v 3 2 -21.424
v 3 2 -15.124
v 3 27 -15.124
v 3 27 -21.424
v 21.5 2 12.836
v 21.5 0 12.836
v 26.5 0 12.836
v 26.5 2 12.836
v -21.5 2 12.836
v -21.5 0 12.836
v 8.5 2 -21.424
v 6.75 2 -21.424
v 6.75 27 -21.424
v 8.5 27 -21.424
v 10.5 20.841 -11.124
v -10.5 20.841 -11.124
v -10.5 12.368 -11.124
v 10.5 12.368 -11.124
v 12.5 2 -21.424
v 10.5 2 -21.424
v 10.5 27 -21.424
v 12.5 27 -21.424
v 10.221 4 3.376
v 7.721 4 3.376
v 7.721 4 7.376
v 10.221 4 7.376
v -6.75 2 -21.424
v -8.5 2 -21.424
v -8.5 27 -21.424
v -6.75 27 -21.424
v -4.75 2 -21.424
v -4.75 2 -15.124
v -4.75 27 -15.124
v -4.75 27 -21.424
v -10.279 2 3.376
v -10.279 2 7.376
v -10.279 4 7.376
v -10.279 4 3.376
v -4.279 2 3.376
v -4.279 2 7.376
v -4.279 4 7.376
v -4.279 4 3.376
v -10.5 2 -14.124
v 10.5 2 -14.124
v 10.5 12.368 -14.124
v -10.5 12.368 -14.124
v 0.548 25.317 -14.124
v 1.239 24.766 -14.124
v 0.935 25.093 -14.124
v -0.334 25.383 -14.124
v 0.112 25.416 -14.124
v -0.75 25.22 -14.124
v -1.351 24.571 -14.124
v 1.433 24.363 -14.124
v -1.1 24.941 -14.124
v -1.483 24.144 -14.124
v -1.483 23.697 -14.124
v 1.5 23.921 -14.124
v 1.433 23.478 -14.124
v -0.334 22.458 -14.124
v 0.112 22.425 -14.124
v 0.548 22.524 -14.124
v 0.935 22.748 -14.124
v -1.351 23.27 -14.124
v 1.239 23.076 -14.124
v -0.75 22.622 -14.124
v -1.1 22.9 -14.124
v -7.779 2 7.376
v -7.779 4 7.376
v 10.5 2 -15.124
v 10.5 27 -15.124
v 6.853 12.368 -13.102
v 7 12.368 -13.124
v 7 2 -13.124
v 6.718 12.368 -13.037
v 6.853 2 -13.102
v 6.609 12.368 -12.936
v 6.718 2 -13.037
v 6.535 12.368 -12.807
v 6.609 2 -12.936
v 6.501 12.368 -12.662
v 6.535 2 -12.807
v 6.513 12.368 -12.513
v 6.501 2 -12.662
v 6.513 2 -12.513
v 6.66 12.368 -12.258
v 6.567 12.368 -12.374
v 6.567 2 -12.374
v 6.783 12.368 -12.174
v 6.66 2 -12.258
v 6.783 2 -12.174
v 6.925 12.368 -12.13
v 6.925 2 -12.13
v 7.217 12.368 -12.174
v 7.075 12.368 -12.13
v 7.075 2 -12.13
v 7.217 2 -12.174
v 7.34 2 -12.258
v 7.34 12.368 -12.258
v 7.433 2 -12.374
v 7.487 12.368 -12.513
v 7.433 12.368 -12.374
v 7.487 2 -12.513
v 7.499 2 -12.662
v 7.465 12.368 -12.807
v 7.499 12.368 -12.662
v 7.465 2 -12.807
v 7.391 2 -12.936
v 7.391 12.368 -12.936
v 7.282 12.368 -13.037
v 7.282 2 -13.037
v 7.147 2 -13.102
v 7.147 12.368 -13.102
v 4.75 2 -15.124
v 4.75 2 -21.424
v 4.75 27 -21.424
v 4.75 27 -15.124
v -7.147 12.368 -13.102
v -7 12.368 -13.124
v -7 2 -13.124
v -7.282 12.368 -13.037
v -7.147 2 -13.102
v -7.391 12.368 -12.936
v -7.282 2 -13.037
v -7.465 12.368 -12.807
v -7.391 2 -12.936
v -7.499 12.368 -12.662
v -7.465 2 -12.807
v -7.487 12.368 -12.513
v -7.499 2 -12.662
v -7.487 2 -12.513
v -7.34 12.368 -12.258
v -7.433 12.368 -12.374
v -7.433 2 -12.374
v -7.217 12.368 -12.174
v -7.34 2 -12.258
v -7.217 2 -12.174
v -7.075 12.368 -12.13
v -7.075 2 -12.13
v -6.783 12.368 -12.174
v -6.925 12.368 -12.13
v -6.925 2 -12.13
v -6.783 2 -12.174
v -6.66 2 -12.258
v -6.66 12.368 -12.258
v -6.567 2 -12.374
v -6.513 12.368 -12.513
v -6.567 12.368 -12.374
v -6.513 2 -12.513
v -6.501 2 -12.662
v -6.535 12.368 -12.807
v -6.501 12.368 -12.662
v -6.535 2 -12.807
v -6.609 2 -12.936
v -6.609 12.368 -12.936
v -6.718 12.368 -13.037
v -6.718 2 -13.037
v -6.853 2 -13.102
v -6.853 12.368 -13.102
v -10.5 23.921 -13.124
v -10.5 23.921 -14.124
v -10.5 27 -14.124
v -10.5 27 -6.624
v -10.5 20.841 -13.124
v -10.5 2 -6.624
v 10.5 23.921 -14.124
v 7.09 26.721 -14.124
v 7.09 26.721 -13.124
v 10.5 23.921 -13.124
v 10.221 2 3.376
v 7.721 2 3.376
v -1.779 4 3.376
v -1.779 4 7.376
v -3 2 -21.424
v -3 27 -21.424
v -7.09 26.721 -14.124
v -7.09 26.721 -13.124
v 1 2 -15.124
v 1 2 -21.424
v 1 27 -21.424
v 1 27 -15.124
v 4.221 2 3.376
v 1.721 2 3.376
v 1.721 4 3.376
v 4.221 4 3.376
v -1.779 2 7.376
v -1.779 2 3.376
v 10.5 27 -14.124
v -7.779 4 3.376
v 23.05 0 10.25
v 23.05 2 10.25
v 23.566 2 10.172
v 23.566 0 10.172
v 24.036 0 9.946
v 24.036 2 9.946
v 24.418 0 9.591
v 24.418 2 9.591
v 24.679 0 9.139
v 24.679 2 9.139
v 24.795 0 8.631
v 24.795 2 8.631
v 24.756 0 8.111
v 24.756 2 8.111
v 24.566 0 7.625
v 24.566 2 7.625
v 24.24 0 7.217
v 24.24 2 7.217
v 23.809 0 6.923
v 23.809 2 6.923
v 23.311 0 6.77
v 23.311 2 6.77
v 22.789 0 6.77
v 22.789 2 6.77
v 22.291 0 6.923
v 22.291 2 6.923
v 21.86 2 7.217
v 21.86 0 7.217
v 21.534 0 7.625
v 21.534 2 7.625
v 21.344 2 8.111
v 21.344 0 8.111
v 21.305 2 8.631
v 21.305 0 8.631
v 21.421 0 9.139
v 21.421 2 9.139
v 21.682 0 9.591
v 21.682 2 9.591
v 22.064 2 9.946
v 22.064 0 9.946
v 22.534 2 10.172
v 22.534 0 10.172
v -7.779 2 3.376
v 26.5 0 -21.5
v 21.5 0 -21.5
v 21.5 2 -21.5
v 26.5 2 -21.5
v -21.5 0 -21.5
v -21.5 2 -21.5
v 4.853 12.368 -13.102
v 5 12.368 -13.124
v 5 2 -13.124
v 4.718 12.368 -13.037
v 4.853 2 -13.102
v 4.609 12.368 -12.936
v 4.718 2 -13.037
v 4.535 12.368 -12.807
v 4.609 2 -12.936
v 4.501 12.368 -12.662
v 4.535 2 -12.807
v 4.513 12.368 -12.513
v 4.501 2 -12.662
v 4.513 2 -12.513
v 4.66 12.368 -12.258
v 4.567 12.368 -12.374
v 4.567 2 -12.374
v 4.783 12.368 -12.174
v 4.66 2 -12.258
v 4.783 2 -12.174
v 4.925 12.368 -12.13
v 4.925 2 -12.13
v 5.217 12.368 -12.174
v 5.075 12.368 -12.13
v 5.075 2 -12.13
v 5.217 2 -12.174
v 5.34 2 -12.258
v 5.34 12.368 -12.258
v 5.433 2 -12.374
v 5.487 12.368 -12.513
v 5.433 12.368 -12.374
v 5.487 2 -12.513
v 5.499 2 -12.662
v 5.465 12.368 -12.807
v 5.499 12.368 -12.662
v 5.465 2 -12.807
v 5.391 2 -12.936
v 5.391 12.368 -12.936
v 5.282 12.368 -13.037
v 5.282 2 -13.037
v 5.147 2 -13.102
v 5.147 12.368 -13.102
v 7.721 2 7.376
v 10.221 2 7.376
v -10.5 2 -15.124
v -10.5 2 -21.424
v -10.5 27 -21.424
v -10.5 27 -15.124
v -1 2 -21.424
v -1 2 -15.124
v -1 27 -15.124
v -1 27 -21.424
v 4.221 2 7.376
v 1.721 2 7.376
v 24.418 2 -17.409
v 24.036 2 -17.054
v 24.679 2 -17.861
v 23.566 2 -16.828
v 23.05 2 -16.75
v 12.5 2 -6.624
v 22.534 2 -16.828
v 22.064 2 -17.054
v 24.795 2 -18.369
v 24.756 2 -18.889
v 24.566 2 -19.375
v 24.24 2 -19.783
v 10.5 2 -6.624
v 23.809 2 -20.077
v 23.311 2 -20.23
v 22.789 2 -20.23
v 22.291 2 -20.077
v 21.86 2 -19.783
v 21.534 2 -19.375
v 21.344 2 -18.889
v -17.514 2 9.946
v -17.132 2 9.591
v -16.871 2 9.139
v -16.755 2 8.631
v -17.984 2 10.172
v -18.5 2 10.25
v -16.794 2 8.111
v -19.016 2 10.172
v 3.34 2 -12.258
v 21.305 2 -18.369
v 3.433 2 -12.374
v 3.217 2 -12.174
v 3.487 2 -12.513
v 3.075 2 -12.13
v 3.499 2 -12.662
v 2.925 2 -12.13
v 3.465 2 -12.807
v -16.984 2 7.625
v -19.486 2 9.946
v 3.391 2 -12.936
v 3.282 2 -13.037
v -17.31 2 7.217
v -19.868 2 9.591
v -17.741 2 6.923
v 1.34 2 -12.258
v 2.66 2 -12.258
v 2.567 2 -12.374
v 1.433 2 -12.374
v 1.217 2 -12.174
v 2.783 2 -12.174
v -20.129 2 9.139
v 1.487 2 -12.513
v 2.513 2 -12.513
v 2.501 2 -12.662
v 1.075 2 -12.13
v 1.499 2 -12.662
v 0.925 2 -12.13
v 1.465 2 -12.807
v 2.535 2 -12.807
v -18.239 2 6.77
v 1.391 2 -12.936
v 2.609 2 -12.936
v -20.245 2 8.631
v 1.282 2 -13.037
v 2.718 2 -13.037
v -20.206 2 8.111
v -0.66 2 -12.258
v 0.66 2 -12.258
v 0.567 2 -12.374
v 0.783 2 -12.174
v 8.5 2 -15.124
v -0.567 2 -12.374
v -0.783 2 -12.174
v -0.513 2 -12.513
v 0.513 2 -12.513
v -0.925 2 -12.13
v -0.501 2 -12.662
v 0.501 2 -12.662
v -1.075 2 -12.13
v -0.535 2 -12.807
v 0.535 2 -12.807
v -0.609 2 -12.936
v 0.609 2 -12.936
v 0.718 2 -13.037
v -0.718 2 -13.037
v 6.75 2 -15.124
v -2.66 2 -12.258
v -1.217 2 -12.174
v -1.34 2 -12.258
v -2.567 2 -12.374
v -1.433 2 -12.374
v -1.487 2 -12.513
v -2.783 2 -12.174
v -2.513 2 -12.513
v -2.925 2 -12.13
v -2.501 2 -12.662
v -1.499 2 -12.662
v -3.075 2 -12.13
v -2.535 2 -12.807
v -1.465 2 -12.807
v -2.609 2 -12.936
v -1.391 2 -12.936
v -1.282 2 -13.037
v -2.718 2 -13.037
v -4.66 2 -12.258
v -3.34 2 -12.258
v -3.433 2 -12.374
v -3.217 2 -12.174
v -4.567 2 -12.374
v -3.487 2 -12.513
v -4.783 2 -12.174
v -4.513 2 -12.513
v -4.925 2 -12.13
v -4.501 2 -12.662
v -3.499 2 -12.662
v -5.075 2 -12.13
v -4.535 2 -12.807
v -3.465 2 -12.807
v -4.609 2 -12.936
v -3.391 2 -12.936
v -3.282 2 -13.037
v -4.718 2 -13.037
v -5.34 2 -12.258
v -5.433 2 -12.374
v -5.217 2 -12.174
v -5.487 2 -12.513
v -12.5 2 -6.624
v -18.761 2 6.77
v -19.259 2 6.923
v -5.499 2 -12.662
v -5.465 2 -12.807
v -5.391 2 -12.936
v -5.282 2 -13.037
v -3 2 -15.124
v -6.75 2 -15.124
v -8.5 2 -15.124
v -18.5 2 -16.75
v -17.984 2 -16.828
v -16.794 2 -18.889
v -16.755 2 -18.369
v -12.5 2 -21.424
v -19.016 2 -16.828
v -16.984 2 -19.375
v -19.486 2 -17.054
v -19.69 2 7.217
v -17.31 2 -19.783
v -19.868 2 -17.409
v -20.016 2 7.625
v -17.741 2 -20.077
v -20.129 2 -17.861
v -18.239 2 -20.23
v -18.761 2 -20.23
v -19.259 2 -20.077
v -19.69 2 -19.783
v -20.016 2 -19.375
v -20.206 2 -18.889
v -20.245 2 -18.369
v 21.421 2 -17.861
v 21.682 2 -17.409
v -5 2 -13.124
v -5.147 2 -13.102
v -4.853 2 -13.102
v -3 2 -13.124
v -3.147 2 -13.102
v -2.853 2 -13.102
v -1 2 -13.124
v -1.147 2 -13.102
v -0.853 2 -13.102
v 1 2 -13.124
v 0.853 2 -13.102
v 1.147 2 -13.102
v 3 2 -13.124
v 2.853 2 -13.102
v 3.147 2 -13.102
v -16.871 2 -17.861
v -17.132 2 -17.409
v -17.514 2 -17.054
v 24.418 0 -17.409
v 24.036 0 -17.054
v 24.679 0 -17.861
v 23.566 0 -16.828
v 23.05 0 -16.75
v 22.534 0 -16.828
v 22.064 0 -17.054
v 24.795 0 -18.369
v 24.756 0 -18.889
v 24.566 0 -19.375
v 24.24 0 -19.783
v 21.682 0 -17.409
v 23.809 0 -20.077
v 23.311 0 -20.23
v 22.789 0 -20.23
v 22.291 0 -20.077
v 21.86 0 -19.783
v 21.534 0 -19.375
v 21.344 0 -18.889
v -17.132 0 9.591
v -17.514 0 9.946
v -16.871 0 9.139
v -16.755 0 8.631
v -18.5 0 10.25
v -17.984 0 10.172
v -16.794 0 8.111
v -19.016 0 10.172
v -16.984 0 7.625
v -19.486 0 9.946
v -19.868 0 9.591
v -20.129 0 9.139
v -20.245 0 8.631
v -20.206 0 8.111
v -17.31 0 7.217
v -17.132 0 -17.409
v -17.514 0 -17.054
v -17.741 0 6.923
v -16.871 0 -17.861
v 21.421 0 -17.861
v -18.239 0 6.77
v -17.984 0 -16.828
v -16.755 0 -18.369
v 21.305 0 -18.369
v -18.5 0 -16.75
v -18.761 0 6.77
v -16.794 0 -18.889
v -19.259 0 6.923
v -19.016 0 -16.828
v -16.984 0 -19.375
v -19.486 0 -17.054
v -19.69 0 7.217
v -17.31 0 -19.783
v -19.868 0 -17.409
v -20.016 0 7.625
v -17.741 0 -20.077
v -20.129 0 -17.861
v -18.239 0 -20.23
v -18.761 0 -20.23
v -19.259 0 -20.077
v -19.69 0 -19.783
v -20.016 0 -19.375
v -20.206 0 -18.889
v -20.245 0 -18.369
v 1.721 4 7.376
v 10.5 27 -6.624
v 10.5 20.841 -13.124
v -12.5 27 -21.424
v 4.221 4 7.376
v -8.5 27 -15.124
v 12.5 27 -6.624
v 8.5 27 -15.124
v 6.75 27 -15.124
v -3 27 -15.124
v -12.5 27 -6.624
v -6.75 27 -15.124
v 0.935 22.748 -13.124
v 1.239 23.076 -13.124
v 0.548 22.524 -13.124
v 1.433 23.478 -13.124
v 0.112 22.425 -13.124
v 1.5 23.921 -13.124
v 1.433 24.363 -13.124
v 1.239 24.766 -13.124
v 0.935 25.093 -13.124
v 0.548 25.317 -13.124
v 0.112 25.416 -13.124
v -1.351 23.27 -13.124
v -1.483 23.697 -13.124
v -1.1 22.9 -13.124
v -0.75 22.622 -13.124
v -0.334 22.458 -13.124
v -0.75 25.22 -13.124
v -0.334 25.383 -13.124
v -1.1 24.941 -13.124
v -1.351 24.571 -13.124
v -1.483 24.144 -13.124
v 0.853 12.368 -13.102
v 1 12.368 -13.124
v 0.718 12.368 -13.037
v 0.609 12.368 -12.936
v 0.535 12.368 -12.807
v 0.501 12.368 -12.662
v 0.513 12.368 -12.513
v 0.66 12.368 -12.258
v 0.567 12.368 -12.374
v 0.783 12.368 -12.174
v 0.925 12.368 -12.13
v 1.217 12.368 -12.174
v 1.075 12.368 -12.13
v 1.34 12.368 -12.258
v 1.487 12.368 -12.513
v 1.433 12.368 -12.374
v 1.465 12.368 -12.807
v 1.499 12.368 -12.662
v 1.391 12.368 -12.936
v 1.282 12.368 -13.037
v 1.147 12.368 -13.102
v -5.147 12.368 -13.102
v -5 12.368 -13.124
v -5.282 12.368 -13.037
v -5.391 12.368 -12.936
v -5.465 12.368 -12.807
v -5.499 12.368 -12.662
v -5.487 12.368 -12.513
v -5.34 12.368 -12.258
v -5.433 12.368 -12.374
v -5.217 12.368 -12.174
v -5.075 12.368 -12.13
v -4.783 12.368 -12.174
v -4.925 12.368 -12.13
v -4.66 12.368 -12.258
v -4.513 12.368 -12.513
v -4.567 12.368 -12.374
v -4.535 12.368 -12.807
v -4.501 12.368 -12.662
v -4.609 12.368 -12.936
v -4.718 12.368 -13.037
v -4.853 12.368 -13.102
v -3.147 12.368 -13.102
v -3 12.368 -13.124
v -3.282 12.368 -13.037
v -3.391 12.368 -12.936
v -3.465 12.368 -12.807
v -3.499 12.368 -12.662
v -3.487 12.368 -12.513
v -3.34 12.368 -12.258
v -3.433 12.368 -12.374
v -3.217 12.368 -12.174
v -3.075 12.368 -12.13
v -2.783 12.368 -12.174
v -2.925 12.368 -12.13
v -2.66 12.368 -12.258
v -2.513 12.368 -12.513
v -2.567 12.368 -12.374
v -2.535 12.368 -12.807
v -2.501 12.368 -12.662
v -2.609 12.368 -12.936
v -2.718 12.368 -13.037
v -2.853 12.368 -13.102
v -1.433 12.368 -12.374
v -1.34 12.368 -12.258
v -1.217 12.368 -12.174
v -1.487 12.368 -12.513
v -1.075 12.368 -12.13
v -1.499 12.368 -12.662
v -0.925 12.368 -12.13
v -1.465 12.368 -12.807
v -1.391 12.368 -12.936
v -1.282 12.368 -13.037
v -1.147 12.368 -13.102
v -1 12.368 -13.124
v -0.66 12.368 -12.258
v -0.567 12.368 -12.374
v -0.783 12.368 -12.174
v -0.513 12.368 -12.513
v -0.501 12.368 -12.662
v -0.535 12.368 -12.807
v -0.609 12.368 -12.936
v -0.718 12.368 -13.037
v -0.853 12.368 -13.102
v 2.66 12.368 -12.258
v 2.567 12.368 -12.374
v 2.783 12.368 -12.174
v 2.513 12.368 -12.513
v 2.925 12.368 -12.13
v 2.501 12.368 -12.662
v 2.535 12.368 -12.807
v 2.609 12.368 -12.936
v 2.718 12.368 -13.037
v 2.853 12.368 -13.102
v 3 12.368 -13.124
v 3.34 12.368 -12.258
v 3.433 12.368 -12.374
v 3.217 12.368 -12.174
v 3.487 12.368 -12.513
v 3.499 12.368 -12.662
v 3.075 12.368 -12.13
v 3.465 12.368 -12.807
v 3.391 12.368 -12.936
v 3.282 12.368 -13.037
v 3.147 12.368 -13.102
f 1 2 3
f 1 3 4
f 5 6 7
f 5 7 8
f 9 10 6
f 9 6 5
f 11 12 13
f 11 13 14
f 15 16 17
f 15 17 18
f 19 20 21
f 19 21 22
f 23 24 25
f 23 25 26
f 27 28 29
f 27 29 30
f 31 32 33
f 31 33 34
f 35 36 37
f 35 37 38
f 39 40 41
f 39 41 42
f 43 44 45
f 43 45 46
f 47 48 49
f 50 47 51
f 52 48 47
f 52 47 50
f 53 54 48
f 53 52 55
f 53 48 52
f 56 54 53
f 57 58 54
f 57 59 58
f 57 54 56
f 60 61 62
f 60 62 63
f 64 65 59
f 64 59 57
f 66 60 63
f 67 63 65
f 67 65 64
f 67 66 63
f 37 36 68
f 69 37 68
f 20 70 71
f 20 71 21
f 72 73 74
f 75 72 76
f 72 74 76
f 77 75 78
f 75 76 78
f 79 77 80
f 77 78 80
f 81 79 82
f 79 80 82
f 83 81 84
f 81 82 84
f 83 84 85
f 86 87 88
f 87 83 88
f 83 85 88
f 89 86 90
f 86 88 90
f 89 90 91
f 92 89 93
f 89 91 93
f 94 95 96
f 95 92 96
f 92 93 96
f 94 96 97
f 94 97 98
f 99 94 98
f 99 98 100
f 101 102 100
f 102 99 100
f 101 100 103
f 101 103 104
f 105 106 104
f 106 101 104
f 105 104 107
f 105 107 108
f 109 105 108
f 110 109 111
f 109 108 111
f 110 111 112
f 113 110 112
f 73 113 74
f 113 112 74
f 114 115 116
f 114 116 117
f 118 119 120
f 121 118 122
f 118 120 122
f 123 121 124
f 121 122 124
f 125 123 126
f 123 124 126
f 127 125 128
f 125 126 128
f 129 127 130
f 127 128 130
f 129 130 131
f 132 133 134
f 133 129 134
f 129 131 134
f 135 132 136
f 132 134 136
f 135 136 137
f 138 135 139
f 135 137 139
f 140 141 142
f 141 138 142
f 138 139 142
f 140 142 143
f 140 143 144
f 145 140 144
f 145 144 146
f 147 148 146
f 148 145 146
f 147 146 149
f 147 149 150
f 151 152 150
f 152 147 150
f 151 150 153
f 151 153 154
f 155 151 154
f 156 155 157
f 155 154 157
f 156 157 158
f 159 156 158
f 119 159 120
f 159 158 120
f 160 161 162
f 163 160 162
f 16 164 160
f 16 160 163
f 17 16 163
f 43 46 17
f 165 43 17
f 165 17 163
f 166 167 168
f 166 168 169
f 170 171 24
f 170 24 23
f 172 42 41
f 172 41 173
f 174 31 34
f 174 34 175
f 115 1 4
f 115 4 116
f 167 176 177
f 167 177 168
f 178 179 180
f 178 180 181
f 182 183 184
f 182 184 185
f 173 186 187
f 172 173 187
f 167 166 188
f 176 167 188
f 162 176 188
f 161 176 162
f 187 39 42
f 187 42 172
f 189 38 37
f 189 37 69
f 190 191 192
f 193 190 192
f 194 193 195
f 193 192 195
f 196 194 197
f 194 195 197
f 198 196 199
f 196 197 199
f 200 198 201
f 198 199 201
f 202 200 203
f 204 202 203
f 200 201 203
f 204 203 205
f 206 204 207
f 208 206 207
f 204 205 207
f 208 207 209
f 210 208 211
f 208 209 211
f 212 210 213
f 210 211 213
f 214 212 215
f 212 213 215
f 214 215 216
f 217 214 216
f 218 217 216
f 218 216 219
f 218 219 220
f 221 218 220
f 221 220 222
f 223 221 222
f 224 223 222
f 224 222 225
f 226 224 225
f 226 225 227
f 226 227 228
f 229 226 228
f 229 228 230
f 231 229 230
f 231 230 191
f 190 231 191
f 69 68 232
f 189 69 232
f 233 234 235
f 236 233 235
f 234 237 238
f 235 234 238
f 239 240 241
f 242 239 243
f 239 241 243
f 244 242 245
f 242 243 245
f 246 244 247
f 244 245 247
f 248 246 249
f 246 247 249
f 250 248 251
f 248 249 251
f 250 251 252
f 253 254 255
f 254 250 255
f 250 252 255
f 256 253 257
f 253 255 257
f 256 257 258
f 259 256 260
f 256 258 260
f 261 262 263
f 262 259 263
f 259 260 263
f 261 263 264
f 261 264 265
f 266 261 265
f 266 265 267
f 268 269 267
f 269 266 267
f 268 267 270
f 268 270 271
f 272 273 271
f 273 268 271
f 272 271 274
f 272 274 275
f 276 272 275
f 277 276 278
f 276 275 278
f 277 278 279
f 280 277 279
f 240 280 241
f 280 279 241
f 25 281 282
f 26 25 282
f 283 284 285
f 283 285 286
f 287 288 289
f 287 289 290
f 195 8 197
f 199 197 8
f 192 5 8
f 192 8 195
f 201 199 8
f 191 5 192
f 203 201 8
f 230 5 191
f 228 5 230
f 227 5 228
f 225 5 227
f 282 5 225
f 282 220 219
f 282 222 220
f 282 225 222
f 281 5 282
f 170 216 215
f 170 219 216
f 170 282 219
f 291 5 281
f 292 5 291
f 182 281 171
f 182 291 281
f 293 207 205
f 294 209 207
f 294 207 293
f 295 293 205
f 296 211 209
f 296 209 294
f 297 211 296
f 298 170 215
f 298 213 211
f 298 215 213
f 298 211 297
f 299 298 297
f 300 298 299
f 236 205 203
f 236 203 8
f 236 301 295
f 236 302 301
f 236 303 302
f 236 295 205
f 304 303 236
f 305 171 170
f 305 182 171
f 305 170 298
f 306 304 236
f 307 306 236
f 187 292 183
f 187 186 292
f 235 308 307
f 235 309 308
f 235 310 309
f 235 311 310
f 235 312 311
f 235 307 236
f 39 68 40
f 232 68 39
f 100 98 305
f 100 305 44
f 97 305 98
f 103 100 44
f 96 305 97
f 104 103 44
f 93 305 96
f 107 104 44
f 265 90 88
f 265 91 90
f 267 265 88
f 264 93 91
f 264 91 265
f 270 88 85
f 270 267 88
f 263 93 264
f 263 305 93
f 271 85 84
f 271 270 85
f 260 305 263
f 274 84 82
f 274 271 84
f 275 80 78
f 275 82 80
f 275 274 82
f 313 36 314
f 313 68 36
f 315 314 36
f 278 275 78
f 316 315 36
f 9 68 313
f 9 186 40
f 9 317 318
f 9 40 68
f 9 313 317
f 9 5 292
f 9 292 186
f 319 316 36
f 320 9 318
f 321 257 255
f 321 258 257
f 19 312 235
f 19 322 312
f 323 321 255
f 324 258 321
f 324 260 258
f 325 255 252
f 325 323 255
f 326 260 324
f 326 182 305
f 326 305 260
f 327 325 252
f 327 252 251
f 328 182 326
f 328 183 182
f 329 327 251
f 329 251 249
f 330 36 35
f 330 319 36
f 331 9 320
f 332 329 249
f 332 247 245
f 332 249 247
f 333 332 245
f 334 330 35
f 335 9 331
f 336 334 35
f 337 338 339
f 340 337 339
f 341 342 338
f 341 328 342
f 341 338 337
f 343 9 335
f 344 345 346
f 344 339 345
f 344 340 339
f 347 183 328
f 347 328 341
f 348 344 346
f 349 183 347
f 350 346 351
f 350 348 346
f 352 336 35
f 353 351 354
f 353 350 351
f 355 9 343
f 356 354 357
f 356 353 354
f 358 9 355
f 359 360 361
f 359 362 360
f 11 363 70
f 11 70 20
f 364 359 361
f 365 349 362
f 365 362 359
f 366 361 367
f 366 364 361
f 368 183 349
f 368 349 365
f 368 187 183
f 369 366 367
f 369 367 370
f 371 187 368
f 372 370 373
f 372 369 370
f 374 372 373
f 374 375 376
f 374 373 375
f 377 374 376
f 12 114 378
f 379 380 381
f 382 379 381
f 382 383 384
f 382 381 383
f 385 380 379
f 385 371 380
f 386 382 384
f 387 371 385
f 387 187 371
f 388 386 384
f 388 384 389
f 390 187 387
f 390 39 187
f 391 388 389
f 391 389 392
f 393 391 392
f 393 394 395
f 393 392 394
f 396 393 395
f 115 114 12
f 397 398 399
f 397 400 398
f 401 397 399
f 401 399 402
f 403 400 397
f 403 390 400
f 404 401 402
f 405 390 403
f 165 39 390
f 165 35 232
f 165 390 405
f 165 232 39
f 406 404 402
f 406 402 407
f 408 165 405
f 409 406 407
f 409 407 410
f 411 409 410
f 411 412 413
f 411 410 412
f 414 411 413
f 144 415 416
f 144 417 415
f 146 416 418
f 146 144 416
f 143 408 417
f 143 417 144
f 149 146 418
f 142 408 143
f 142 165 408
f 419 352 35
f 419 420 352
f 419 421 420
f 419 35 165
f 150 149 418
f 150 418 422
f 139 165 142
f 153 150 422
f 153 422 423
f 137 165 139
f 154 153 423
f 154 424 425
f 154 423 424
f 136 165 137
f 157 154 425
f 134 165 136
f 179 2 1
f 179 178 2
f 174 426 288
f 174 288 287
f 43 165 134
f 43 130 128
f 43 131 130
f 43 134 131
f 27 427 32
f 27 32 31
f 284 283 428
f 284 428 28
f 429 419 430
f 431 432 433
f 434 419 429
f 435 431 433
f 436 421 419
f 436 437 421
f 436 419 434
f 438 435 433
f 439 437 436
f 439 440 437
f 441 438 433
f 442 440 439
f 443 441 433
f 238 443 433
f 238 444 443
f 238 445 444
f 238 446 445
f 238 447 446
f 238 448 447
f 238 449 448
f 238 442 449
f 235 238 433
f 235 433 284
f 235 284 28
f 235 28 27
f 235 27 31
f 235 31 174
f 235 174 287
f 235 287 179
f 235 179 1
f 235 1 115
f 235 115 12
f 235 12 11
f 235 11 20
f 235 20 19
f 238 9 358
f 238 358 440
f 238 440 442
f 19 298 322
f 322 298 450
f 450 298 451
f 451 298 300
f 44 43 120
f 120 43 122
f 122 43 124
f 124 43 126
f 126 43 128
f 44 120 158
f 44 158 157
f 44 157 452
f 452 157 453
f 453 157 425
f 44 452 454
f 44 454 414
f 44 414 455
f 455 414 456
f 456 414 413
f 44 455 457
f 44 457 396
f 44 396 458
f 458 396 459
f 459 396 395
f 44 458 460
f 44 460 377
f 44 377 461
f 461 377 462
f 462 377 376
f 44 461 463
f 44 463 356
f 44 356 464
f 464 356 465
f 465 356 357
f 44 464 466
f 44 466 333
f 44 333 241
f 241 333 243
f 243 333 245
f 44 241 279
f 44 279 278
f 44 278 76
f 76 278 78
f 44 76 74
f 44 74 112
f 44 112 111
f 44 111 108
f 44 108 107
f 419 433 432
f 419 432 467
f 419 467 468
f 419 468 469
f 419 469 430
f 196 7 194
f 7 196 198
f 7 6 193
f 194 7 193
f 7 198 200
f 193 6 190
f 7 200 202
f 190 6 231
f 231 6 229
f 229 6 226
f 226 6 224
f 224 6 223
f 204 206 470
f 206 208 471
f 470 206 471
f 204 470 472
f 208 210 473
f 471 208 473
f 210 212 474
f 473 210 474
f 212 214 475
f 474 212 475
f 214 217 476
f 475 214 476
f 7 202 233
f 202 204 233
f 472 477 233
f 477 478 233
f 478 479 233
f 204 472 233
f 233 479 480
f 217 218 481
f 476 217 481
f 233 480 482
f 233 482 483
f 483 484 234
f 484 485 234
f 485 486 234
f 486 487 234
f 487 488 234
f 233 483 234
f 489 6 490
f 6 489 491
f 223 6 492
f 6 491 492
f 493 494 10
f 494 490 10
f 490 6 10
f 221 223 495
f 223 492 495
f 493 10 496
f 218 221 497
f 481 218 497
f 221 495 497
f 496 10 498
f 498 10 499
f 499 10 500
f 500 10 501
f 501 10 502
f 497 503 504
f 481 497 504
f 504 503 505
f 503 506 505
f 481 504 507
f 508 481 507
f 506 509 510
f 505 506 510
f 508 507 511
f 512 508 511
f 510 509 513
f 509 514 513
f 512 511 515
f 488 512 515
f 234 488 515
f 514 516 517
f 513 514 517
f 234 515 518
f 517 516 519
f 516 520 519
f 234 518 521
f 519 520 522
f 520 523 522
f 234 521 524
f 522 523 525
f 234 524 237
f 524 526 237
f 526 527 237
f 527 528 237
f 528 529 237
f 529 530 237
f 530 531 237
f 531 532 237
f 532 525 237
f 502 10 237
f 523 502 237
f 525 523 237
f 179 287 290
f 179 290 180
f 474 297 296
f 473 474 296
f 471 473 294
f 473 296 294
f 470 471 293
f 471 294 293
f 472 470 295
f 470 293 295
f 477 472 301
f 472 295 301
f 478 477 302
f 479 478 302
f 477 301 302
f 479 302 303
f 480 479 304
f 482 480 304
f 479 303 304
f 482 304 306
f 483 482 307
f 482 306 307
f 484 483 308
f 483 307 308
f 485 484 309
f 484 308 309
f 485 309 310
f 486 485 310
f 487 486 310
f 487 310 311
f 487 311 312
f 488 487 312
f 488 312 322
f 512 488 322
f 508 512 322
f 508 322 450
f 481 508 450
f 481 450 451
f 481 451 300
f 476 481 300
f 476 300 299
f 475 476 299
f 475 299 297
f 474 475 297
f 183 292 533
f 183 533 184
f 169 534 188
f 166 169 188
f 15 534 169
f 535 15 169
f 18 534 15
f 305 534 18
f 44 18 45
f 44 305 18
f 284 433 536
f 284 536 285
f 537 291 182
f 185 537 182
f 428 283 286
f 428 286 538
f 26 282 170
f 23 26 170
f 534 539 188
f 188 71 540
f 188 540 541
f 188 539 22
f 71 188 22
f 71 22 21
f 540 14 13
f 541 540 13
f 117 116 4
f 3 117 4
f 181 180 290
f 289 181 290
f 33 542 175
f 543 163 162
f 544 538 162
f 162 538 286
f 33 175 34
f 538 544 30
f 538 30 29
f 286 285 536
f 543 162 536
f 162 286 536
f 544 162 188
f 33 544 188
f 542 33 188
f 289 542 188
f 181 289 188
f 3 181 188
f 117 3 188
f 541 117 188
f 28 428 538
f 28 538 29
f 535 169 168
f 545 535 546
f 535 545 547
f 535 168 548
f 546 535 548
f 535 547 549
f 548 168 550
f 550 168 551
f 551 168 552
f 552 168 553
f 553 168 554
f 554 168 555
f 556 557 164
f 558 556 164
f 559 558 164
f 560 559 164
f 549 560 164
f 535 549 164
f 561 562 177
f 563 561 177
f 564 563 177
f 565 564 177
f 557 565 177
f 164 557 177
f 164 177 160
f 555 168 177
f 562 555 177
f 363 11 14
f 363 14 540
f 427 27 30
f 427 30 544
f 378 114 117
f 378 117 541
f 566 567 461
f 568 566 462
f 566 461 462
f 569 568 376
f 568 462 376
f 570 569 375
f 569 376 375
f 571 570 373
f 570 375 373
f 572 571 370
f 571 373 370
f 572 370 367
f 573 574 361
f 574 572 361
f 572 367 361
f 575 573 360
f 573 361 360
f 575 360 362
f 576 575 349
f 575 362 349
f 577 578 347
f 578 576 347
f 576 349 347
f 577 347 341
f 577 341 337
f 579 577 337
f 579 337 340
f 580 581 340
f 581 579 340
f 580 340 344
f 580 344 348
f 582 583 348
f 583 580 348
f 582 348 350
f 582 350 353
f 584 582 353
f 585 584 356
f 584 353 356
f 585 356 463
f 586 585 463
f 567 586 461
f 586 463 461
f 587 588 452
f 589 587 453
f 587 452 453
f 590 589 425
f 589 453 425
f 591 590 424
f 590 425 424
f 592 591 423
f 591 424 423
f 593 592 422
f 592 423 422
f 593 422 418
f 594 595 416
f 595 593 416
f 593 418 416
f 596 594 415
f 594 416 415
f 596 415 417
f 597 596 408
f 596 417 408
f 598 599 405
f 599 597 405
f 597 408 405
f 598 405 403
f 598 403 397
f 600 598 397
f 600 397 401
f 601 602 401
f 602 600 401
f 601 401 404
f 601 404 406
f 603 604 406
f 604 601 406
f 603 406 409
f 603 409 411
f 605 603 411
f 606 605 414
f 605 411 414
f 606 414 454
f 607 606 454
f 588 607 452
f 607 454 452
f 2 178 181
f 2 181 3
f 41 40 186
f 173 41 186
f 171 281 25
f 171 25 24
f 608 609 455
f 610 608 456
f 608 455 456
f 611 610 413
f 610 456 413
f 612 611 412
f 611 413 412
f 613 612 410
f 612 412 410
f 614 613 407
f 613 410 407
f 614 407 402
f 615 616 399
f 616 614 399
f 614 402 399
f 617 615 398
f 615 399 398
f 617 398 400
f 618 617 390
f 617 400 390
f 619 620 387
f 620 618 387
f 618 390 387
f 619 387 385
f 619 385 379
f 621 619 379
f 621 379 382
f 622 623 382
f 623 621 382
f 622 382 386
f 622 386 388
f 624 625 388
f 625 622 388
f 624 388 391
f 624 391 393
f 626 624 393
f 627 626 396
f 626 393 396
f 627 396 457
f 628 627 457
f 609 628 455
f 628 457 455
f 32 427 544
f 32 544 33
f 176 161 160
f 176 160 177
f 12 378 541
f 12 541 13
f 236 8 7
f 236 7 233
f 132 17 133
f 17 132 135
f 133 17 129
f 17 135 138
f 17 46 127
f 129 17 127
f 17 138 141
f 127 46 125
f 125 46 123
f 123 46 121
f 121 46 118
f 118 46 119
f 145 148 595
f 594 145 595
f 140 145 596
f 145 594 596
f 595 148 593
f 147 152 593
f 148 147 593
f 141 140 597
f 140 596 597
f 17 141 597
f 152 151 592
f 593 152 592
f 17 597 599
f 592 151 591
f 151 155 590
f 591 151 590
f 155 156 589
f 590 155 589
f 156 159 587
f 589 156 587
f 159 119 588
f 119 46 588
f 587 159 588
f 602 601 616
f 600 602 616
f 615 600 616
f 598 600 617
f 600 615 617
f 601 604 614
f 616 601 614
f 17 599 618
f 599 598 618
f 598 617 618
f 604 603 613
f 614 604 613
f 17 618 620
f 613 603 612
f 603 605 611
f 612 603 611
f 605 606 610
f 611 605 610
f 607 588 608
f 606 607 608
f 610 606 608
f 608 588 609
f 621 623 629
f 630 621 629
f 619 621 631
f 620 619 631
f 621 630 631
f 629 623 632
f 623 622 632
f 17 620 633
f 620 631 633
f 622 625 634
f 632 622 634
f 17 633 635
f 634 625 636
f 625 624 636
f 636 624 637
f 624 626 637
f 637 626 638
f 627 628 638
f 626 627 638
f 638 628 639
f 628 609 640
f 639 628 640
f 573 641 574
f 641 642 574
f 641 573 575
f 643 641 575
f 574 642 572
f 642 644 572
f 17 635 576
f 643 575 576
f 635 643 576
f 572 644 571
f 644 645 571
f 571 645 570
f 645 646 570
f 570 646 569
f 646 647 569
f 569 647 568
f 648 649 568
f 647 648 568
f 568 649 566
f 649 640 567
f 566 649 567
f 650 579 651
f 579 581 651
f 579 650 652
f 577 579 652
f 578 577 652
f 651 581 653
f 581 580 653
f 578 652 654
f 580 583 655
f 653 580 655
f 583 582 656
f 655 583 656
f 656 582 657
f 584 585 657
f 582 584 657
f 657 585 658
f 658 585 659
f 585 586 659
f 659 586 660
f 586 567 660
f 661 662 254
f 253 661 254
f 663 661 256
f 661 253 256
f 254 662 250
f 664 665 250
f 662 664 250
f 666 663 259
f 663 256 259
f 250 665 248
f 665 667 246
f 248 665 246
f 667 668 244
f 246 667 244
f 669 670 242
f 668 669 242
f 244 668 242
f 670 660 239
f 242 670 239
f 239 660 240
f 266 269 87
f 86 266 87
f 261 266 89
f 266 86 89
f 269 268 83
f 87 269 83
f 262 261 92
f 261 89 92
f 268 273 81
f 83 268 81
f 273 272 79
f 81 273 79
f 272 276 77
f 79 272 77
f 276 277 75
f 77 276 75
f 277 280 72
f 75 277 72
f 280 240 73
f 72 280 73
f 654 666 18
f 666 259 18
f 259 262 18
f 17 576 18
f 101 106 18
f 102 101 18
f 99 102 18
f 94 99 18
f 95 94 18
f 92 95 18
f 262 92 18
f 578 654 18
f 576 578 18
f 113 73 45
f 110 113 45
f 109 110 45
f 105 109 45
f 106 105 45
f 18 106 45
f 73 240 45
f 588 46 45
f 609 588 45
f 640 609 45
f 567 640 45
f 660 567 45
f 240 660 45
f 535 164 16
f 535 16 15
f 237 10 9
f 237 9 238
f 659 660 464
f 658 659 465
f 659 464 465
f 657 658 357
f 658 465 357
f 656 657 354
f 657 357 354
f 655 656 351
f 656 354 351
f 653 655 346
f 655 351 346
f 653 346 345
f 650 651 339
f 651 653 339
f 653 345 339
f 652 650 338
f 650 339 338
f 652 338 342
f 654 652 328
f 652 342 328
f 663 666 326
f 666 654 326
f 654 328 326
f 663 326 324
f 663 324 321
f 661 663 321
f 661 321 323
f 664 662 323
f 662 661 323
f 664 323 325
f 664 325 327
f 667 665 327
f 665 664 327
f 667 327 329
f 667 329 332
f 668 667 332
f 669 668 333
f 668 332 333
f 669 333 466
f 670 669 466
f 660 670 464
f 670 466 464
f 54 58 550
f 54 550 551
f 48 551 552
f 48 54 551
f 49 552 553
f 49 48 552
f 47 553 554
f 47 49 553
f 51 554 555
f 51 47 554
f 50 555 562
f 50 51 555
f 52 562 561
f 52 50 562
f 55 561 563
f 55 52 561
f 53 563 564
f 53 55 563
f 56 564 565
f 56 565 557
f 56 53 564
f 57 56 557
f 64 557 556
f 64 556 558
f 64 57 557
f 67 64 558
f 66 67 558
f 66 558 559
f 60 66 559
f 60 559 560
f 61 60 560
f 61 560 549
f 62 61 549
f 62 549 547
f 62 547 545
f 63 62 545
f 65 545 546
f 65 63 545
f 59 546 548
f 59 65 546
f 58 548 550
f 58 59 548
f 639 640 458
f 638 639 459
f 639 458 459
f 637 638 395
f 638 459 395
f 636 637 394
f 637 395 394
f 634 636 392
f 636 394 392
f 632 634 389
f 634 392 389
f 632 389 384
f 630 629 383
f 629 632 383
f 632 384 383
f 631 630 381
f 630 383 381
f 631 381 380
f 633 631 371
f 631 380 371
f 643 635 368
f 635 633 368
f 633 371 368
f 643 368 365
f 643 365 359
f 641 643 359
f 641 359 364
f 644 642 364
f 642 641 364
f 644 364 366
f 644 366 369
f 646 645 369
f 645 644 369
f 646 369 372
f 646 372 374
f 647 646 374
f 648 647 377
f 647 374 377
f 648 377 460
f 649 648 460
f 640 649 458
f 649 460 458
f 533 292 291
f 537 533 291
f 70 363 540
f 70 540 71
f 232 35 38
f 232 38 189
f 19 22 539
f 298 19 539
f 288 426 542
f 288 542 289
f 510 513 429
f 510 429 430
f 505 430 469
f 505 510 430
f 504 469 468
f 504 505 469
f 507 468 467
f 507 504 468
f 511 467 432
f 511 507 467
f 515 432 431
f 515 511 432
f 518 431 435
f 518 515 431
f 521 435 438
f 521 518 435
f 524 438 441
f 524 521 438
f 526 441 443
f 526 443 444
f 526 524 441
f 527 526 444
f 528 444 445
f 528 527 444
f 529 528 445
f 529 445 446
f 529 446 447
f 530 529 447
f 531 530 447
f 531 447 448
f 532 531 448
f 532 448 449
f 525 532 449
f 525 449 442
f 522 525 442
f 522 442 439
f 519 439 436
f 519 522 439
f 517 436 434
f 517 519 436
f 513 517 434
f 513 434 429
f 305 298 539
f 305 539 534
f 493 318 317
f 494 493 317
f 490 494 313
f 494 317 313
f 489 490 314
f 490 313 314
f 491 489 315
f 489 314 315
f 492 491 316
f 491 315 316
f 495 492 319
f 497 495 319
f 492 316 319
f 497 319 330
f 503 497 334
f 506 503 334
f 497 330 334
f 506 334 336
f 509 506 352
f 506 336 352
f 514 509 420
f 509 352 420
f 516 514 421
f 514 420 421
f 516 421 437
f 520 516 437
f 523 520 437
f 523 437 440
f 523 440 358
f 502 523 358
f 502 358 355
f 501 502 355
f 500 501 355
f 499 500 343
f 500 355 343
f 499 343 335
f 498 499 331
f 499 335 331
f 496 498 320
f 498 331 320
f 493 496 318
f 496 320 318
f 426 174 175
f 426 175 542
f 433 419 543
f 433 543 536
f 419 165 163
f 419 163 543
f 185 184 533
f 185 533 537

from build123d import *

# Parameters (mm, degrees)
SKETCH1_W                = 43
SKETCH1_H                = 43
SKETCH1_R                = 1.75
BOSS_EXTRUDE1_DEPTH      = 2
BOSS_EXTRUDE2_DEPTH      = 1.5
SKETCH3_R                = 0.69895541
SKETCH3_R_2              = 0.7
BOSS_EXTRUDE3_DEPTH      = 6.5
SKETCH4_W                = 7.9
SKETCH4_H                = 11.24
SKETCH4_W_2              = 16.08
SKETCH4_H_2              = 7.9
BOSS_EXTRUDE4_DEPTH      = 10
BOSS_EXTRUDE5_DEPTH      = 25
SKETCH10_W               = 21
SKETCH10_H               = 8.473082751
BOSS_EXTRUDE6_DEPTH      = 3
SKETCH11_R               = 1.5
BOSS_EXTRUDE7_DEPTH      = 1
SKETCH12_R               = 0.5
BOSS_EXTRUDE8_DEPTH      = 11
SKETCH13_W               = 4
SKETCH13_H               = 5
CUT_EXTRUDE5_DEPTH       = 5
SKETCH16_W               = 2.5
SKETCH16_H               = 4
BOSS_EXTRUDE9_DEPTH      = 2
SKETCH17_W               = 4
SKETCH17_H               = 5
CUT_EXTRUDE6_DEPTH       = 5
SKETCH18_W               = 4
SKETCH18_H               = 5
CUT_EXTRUDE7_DEPTH       = 5
SKETCH19_R               = 2
CUT_EXTRUDE8_DEPTH       = 2
CUT_EXTRUDE9_DEPTH       = 1
BOSS_EXTRUDE10_START     = -2
SKETCH21_R               = 1.75
BOSS_EXTRUDE10_DEPTH     = 2
CUT_EXTRUDE11_DEPTH      = 12
CUT_EXTRUDE11_DEPTH_BACK = 2
SKETCH22_W               = 43
SKETCH22_H               = 8.664223245
SKETCH23_W               = 34.335776755
SKETCH23_H               = 2
BOSS_EXTRUDE11_DEPTH     = 5
SKETCH24_R               = 1.75
CUT_EXTRUDE12_DEPTH      = 5
SKETCH25_W               = 7.9
SKETCH25_H               = 11.24
CUT_EXTRUDE13_DEPTH      = 10
SKETCH26_R               = 1.75
CUT_EXTRUDE14_DEPTH      = 2
SKETCH27_W               = 7.9
SKETCH27_H               = 11.24
CUT_EXTRUDE15_DEPTH      = 10


with BuildPart() as part:
    # Sketch1 → Boss-Extrude1 (new body)
    with BuildSketch(Plane(origin=(0, 0, 0), x_dir=(1, 0, 0), z_dir=(0, 1, 0))):
        Rectangle(SKETCH1_W, SKETCH1_H)
        with Locations(Location((-18.5, -18.5, 0), (0, 0, 270))):
            Circle(SKETCH1_R, mode=Mode.SUBTRACT)
        with Locations(Location((18.5, -18.5, 0), (0, 0, 270))):
            Circle(SKETCH1_R, mode=Mode.SUBTRACT)
        with Locations(Location((-18.5, 18.5, 0), (0, 0, 270))):
            Circle(SKETCH1_R, mode=Mode.SUBTRACT)
        with Locations(Location((18.5, 18.5, 0), (0, 0, 270))):
            Circle(SKETCH1_R, mode=Mode.SUBTRACT)
    extrude(amount=BOSS_EXTRUDE1_DEPTH)

    # Sketch2 → Boss-Extrude2 (add)
    with BuildSketch(Plane(origin=(0, 2, 0), x_dir=(1, 0, 0), z_dir=(0, 1, 0))):
        Polygon((0.830748064, -14.345776755), (0.830748064, -19.775776755), (15.700748064, -19.775776755), (15.700748064, -14.345776755), (13.280748064, -14.345776755), (13.280748064, -16.765776755), (3.250748064, -16.765776755), (3.250748064, -14.345776755), align=None)
    extrude(amount=BOSS_EXTRUDE2_DEPTH)

    # Sketch3 → Boss-Extrude3 (add)
    with BuildSketch(Plane(origin=(0, 3.5, 0), x_dir=(1, 0, 0), z_dir=(0, 1, 0))):
        with Locations(Location((2.040748064, -18.225776755, 0), (0, 0, 90))):
            Circle(SKETCH3_R)
        with Locations(Location((4.530748064, -18.225776755, 0), (0, 0, 90))):
            Circle(SKETCH3_R)
        with Locations(Location((7.020748064, -18.225776755, 0), (0, 0, 90))):
            Circle(SKETCH3_R)
        with Locations(Location((9.510748064, -18.225776755, 0), (0, 0, 90))):
            Circle(SKETCH3_R)
        with Locations(Location((12.000748064, -18.225776755, 0), (0, 0, 90))):
            Circle(SKETCH3_R)
        with Locations(Location((14.490748064, -18.225776755, 0), (0, 0, 90))):
            Circle(SKETCH3_R)
        with Locations(Location((2.040748064, -15.735776755, 0), (0, 0, 90))):
            Circle(SKETCH3_R_2)
        with Locations(Location((14.490748064, -15.735776755, 0), (0, 0, 90))):
            Circle(SKETCH3_R_2)
    extrude(amount=BOSS_EXTRUDE3_DEPTH)

    # Sketch4 → Boss-Extrude4 (add)
    with BuildSketch(Plane(origin=(0, 2, 0), x_dir=(1, 0, 0), z_dir=(0, 1, 0))):
        with Locations((-17.229251936, -6.515776755)):
            Rectangle(SKETCH4_W, SKETCH4_H)
        with Locations((-7.599251936, -17.325776755)):
            Rectangle(SKETCH4_W_2, SKETCH4_H_2)
        with Locations((17.229251936, -6.515776755)):
            Rectangle(SKETCH4_W, SKETCH4_H)
    extrude(amount=BOSS_EXTRUDE4_DEPTH)

    # Sketch8 → Boss-Extrude5 (add)
    with BuildSketch(Plane(origin=(0, 2, 0), x_dir=(1, 0, 0), z_dir=(0, 1, 0))):
        Polygon((3, 21.424223245), (4.75, 21.424223245), (4.75, 15.124223245), (6.75, 15.124223245), (6.75, 21.424223245), (8.5, 21.424223245), (8.5, 15.124223245), (10.5, 15.124223245), (10.5, 21.424223245), (12.5, 21.424223245), (12.5, 6.624223245), (10.5, 6.624223245), (10.5, 14.124223245), (-10.5, 14.124223245), (-10.5, 6.624223245), (-12.5, 6.624223245), (-12.5, 21.424223245), (-10.5, 21.424223245), (-10.5, 15.124223245), (-8.5, 15.124223245), (-8.5, 21.424223245), (-6.75, 21.424223245), (-6.75, 15.124223245), (-4.75, 15.124223245), (-4.75, 21.424223245), (-3, 21.424223245), (-3, 15.124223245), (-1, 15.124223245), (-1, 21.424223245), (1, 21.424223245), (1, 15.124223245), (3, 15.124223245), align=None)
    extrude(amount=BOSS_EXTRUDE5_DEPTH)

    # Sketch10 → Boss-Extrude6 (add)
    with BuildSketch(Plane.XY.offset(-14.124223245)):
        with Locations((0, 16.604600605)):
            Rectangle(SKETCH10_W, SKETCH10_H)
    extrude(amount=BOSS_EXTRUDE6_DEPTH)

    # Sketch11 → Boss-Extrude7 (add)
    with BuildSketch(Plane.XY.offset(-14.124223245)):
        Polygon((-10.5, 23.92057099), (-7.090362565, 26.720500705), (7.090362565, 26.720500705), (10.5, 23.92057099), (10.5, 20.841141981), (-10.5, 20.841141981), align=None)
        with Locations((0, 23.92057099)):
            Circle(SKETCH11_R, mode=Mode.SUBTRACT)
    extrude(amount=BOSS_EXTRUDE7_DEPTH)

    # Sketch12 → Boss-Extrude8 (add)
    with BuildSketch(Plane(origin=(0, 2, 0), x_dir=(1, 0, 0), z_dir=(0, 1, 0))):
        with Locations(Location((-7, 12.624223245, 0), (0, 0, 90))):
            Circle(SKETCH12_R)
        with Locations(Location((-5, 12.624223245, 0), (0, 0, 90))):
            Circle(SKETCH12_R)
        with Locations(Location((-3, 12.624223245, 0), (0, 0, 90))):
            Circle(SKETCH12_R)
        with Locations(Location((-1, 12.624223245, 0), (0, 0, 90))):
            Circle(SKETCH12_R)
        with Locations(Location((1, 12.624223245, 0), (0, 0, 90))):
            Circle(SKETCH12_R)
        with Locations(Location((3, 12.624223245, 0), (0, 0, 90))):
            Circle(SKETCH12_R)
        with Locations(Location((5, 12.624223245, 0), (0, 0, 90))):
            Circle(SKETCH12_R)
        with Locations(Location((7, 12.624223245, 0), (0, 0, 90))):
            Circle(SKETCH12_R)
    extrude(amount=BOSS_EXTRUDE8_DEPTH)

    # Sketch13 → Cut-Extrude5 (cut)
    with BuildSketch(Plane.ZY.offset(21.179251936)):
        with Locations((4.015776755, 5.5)):
            Rectangle(SKETCH13_W, SKETCH13_H)
        with Locations((9.015776755, 5.5)):
            Rectangle(SKETCH13_W, SKETCH13_H)
    extrude(amount=-CUT_EXTRUDE5_DEPTH, mode=Mode.SUBTRACT)

    # Sketch16 → Boss-Extrude9 (add)
    with BuildSketch(Plane(origin=(0, 2, 0), x_dir=(1, 0, 0), z_dir=(0, 1, 0))):
        with Locations((-9.029251936, -5.375776755)):
            Rectangle(SKETCH16_W, SKETCH16_H)
        with Locations((-3.029251936, -5.375776755)):
            Rectangle(SKETCH16_W, SKETCH16_H)
        with Locations((2.970748064, -5.375776755)):
            Rectangle(SKETCH16_W, SKETCH16_H)
        with Locations((8.970748064, -5.375776755)):
            Rectangle(SKETCH16_W, SKETCH16_H)
    extrude(amount=BOSS_EXTRUDE9_DEPTH)

    # Sketch17 → Cut-Extrude6 (cut)
    with BuildSketch(Plane.XY.offset(21.275776755)):
        with Locations((-13.139251936, 5.5)):
            Rectangle(SKETCH17_W, SKETCH17_H)
        with Locations((-7.639251936, 5.5)):
            Rectangle(SKETCH17_W, SKETCH17_H)
        with Locations((-2.139251936, 5.5)):
            Rectangle(SKETCH17_W, SKETCH17_H)
    extrude(amount=-CUT_EXTRUDE6_DEPTH, mode=Mode.SUBTRACT)

    # Sketch18 → Cut-Extrude7 (cut)
    with BuildSketch(Plane(origin=(21.179251936, 0, 0), x_dir=(0, 0, -1), z_dir=(1, 0, 0))):
        with Locations((-9.015776755, 5.5)):
            Rectangle(SKETCH18_W, SKETCH18_H)
        with Locations((-4.015776755, 5.5)):
            Rectangle(SKETCH18_W, SKETCH18_H)
    extrude(amount=-CUT_EXTRUDE7_DEPTH, mode=Mode.SUBTRACT)

    # Sketch19 → Cut-Extrude8 (cut)
    with BuildSketch(Plane(origin=(0, 12, 0), x_dir=(1, 0, 0), z_dir=(0, 1, 0))):
        with Locations(Location((-17.229251936, -3.895776755, 0), (0, 0, 270))):
            Circle(SKETCH19_R)
        with Locations(Location((-17.229251936, -9.135776755, 0), (0, 0, 270))):
            Circle(SKETCH19_R)
        with Locations(Location((-12.639251936, -17.325776755, 0), (0, 0, 270))):
            Circle(SKETCH19_R)
        with Locations(Location((-7.639251936, -17.325776755, 0), (0, 0, 270))):
            Circle(SKETCH19_R)
        with Locations(Location((-2.639251936, -17.325776755, 0), (0, 0, 270))):
            Circle(SKETCH19_R)
        with Locations(Location((17.229251936, -9.135776755, 0), (0, 0, 90))):
            Circle(SKETCH19_R)
        with Locations(Location((17.229251936, -3.895776755, 0), (0, 0, 90))):
            Circle(SKETCH19_R)
    extrude(amount=-CUT_EXTRUDE8_DEPTH, mode=Mode.SUBTRACT)

    # Sketch20 → Cut-Extrude9 (cut)
    with BuildSketch(Plane(origin=(0, 10, 0), x_dir=(1, 0, 0), z_dir=(0, 1, 0))):
        with BuildLine():
            Line((-8.314251936, -15.443125699), (-8.314251936, -19.208427811))
            ThreePointArc((-8.314251936, -19.208427811), (-7.639251936, -19.325776755), (-6.964251936, -19.208427811))
            Line((-6.964251936, -19.208427811), (-6.964251936, -15.443125699))
            ThreePointArc((-6.964251936, -15.443125699), (-7.639251936, -15.325776755), (-8.314251936, -15.443125699))
        make_face()
        with BuildLine():
            Line((-3.314251936, -15.443125699), (-3.314251936, -19.208427811))
            ThreePointArc((-3.314251936, -19.208427811), (-2.639251936, -19.325776755), (-1.964251936, -19.208427811))
            Line((-1.964251936, -19.208427811), (-1.964251936, -15.443125699))
            ThreePointArc((-1.964251936, -15.443125699), (-2.639251936, -15.325776755), (-3.314251936, -15.443125699))
        make_face()
        with BuildLine():
            Line((-16.554251936, -2.013478411), (-16.554251936, -5.778075099))
            ThreePointArc((-16.554251936, -5.778075099), (-17.229251936, -5.895444741), (-17.904251936, -5.778075099))
            Line((-17.904251936, -5.778075099), (-17.904251936, -2.013478411))
            ThreePointArc((-17.904251936, -2.013478411), (-17.229251936, -1.896108769), (-16.554251936, -2.013478411))
        make_face()
        with BuildLine():
            Line((-16.554251936, -11.018075099), (-16.554251936, -7.253478411))
            ThreePointArc((-16.554251936, -7.253478411), (-17.229251936, -7.136108769), (-17.904251936, -7.253478411))
            Line((-17.904251936, -7.253478411), (-17.904251936, -11.018075099))
            ThreePointArc((-17.904251936, -11.018075099), (-17.229251936, -11.135444741), (-16.554251936, -11.018075099))
        make_face()
        with BuildLine():
            Line((-11.964251936, -19.216907159), (-11.964251936, -15.434646351))
            ThreePointArc((-11.964251936, -15.434646351), (-12.639251936, -15.317792889), (-13.314251936, -15.434646351))
            Line((-13.314251936, -15.434646351), (-13.314251936, -19.216907159))
            ThreePointArc((-13.314251936, -19.216907159), (-12.639251936, -19.333760621), (-11.964251936, -19.216907159))
        make_face()
        with BuildLine():
            Line((17.904251936, -11.018075099), (17.904251936, -7.253478411))
            ThreePointArc((17.904251936, -7.253478411), (17.229251936, -7.136108769), (16.554251936, -7.253478411))
            Line((16.554251936, -7.253478411), (16.554251936, -11.018075099))
            ThreePointArc((16.554251936, -11.018075099), (17.229251936, -11.135444741), (17.904251936, -11.018075099))
        make_face()
        with BuildLine():
            Line((17.904251936, -2.013478411), (17.904251936, -5.778075099))
            ThreePointArc((17.904251936, -5.778075099), (17.229251936, -5.895444741), (16.554251936, -5.778075099))
            Line((16.554251936, -5.778075099), (16.554251936, -2.013478411))
            ThreePointArc((16.554251936, -2.013478411), (17.229251936, -1.896108769), (17.904251936, -2.013478411))
        make_face()
    extrude(amount=-CUT_EXTRUDE9_DEPTH, mode=Mode.SUBTRACT)

    # Sketch21 → Boss-Extrude10 (add)
    with BuildSketch(Plane(origin=(0, 2, 0), x_dir=(1, 0, 0), z_dir=(0, 1, 0)).offset(BOSS_EXTRUDE10_START)):
        with Locations((18.5, 18.5)):
            Circle(SKETCH21_R)
        with Locations((-18.5, -18.5)):
            Circle(SKETCH21_R)
        with Locations((18.5, -18.5)):
            Circle(SKETCH21_R)
    extrude(amount=BOSS_EXTRUDE10_DEPTH)

    # Sketch22 → Cut-Extrude11 (cut, two sides: drawn at the far end of the back side and taken through both)
    with BuildSketch(Plane(origin=(0, 2, 0), x_dir=(1, 0, 0), z_dir=(0, 1, 0)).offset(-CUT_EXTRUDE11_DEPTH_BACK)):
        with Locations((0, -17.167888377)):
            Rectangle(SKETCH22_W, SKETCH22_H)
    extrude(amount=CUT_EXTRUDE11_DEPTH + CUT_EXTRUDE11_DEPTH_BACK, mode=Mode.SUBTRACT)

    # Sketch23 → Boss-Extrude11 (add)
    with BuildSketch(Plane(origin=(21.5, 0, 0), x_dir=(0, 0, -1), z_dir=(1, 0, 0))):
        with Locations((4.332111622, 1)):
            Rectangle(SKETCH23_W, SKETCH23_H)
    extrude(amount=BOSS_EXTRUDE11_DEPTH)

    # Sketch24 → Cut-Extrude12 (cut)
    with BuildSketch(Plane(origin=(0, 2, 0), x_dir=(1, 0, 0), z_dir=(0, 1, 0))):
        with Locations(Location((23.05, 18.5, 0), (0, 0, 270))):
            Circle(SKETCH24_R)
        with Locations(Location((23.05, -8.5, 0), (0, 0, 270))):
            Circle(SKETCH24_R)
    extrude(amount=-CUT_EXTRUDE12_DEPTH, mode=Mode.SUBTRACT)

    # Sketch25 → Cut-Extrude13 (cut)
    with BuildSketch(Plane(origin=(0, 12, 0), x_dir=(1, 0, 0), z_dir=(0, 1, 0))):
        with Locations((-17.229251936, -6.515776755)):
            Rectangle(SKETCH25_W, SKETCH25_H)
    extrude(amount=-CUT_EXTRUDE13_DEPTH, mode=Mode.SUBTRACT)

    # Sketch26 → Cut-Extrude14 (cut)
    with BuildSketch(Plane(origin=(0, 2, 0), x_dir=(1, 0, 0), z_dir=(0, 1, 0))):
        with Locations(Location((-18.5, -8.5, 0), (0, 0, 270))):
            Circle(SKETCH26_R)
    extrude(amount=-CUT_EXTRUDE14_DEPTH, mode=Mode.SUBTRACT)

    # Sketch27 → Cut-Extrude15 (cut)
    with BuildSketch(Plane(origin=(0, 12, 0), x_dir=(1, 0, 0), z_dir=(0, 1, 0))):
        with Locations((17.229251936, -6.515776755)):
            Rectangle(SKETCH27_W, SKETCH27_H)
    extrude(amount=-CUT_EXTRUDE15_DEPTH, mode=Mode.SUBTRACT)


solid = part.part
